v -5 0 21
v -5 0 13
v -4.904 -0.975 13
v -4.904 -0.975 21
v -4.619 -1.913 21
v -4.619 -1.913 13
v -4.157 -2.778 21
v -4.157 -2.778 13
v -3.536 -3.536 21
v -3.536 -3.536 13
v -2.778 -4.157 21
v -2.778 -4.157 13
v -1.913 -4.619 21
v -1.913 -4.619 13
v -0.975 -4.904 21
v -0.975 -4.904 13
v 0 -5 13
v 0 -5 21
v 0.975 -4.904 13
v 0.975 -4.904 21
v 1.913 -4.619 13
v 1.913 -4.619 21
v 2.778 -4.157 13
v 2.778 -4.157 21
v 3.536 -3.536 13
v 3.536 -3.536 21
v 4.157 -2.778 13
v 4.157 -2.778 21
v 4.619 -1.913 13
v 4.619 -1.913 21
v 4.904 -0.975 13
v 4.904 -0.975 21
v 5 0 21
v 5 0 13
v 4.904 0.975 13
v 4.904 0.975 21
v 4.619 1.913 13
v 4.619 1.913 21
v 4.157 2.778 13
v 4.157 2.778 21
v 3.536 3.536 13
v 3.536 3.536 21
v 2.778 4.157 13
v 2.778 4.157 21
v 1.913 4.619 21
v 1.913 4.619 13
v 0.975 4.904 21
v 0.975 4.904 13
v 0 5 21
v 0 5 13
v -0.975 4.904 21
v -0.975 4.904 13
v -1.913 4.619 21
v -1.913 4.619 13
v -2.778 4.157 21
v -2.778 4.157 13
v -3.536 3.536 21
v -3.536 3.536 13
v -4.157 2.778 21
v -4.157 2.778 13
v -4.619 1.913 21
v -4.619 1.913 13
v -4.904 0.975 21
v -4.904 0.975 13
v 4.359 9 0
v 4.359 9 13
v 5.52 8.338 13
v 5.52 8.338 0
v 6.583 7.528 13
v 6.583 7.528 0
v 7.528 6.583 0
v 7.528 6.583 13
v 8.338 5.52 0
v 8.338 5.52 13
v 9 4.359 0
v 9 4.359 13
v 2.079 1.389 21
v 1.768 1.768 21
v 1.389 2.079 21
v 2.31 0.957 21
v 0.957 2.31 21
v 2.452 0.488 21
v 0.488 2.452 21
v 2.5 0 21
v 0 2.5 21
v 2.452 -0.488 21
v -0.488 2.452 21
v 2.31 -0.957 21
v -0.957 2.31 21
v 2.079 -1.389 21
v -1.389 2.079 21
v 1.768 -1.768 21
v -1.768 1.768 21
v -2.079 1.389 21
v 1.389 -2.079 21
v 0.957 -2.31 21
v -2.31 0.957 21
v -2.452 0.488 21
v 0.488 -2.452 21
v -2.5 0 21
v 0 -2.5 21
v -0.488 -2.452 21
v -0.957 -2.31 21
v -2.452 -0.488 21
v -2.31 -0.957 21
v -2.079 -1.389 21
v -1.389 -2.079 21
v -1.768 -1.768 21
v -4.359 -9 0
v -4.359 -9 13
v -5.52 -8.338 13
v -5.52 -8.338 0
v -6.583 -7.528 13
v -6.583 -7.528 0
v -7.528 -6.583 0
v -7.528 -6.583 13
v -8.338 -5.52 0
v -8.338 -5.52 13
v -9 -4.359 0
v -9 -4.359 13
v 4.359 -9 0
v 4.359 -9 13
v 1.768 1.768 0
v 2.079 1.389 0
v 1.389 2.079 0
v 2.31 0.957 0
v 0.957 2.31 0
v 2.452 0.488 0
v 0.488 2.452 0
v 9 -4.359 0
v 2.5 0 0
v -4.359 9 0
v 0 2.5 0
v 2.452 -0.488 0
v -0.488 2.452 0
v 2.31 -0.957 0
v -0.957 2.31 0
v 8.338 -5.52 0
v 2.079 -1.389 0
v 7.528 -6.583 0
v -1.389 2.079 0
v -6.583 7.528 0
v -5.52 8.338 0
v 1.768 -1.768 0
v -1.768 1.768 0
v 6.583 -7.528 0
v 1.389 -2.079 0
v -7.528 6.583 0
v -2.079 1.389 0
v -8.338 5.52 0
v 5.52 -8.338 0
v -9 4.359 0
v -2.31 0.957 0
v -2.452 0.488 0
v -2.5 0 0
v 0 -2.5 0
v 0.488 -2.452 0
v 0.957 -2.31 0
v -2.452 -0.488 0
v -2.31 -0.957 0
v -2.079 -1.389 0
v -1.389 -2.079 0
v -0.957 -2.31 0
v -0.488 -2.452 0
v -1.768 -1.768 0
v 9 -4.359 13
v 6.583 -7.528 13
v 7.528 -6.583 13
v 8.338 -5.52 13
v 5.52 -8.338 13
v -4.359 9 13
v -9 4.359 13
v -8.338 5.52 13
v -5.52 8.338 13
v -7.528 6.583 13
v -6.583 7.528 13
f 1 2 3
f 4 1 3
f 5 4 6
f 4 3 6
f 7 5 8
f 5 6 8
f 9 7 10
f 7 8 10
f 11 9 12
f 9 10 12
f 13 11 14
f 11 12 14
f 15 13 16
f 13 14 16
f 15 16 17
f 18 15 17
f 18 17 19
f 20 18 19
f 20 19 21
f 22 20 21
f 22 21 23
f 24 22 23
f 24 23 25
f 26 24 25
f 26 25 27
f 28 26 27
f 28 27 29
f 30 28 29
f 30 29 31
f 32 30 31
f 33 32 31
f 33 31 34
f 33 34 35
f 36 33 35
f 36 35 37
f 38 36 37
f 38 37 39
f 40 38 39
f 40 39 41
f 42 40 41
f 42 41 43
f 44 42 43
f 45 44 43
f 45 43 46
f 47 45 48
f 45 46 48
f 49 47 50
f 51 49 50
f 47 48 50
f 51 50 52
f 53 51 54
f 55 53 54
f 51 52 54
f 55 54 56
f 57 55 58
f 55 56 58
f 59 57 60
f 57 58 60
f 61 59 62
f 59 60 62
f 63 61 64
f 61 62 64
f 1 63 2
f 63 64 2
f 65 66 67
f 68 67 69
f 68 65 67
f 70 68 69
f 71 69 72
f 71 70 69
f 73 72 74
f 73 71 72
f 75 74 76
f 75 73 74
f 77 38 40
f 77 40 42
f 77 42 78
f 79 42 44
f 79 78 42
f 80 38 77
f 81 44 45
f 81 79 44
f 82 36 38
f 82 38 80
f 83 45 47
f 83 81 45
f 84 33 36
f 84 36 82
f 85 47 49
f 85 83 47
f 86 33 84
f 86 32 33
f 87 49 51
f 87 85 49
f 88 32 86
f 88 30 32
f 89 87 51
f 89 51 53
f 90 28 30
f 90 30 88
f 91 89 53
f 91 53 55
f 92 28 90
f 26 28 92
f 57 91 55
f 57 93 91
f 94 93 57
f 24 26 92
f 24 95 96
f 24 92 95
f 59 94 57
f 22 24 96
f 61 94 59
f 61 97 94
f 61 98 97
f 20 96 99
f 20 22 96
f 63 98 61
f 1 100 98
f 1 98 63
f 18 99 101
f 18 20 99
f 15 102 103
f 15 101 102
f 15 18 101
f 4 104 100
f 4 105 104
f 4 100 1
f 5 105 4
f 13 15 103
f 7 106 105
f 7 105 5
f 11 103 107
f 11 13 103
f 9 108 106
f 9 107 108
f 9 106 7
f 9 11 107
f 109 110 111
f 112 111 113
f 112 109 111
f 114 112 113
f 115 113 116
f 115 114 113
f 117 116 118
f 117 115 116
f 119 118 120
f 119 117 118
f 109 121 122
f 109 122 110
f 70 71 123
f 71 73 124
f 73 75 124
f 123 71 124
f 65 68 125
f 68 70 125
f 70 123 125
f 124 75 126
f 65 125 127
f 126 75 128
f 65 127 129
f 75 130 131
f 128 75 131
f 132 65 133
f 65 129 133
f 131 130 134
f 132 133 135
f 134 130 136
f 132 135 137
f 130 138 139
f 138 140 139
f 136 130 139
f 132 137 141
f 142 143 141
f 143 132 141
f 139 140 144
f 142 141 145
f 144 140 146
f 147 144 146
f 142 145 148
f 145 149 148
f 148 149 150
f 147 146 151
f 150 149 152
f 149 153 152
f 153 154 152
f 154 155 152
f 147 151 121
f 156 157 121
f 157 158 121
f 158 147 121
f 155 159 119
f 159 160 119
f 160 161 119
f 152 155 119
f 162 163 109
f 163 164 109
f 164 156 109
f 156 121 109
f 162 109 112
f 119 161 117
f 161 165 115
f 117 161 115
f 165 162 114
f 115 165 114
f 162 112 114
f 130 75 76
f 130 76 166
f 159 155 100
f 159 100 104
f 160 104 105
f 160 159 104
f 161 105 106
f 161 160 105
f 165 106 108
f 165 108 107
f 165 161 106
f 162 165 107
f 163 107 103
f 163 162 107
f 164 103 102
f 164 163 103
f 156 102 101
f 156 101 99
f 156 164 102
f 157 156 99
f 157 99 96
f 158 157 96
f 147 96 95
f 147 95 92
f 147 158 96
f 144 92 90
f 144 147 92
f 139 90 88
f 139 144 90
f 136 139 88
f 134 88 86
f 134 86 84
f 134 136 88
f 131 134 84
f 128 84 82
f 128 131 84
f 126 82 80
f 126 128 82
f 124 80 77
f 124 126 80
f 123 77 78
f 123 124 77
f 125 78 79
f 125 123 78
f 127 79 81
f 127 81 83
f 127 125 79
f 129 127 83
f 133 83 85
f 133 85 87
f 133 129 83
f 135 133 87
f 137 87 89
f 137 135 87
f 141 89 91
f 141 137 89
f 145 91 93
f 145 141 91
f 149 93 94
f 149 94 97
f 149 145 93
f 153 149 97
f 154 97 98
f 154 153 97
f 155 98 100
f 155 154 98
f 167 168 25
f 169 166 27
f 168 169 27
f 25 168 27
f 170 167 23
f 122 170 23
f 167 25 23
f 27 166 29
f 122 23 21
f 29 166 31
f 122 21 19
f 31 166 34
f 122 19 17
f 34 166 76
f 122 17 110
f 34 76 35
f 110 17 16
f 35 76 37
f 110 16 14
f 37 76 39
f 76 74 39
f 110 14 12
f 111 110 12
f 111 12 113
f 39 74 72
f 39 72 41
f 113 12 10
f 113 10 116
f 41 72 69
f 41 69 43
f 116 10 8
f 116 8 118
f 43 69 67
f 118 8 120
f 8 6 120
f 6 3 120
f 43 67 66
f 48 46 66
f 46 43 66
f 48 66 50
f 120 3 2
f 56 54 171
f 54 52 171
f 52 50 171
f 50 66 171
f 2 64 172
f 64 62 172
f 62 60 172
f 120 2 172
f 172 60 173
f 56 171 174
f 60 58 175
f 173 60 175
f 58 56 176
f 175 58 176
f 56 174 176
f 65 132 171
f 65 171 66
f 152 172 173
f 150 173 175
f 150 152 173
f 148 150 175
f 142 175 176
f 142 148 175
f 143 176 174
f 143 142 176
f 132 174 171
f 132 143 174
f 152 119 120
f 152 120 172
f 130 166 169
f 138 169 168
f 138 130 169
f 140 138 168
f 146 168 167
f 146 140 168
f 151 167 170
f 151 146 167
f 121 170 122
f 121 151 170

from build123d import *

# Parameters (mm, degrees)
BOSS_EXTRUDE2_DEPTH = 13
SKETCH2_R           = 5
BOSS_EXTRUDE3_DEPTH = 21
SKETCH4_R           = 2.5
CUT_EXTRUDE1_DEPTH  = 21


with BuildPart() as part:
    # Sketch1 → Boss-Extrude2 (new body)
    with BuildSketch(Plane.XY):
        with BuildLine():
            Line((-4.358898944, 9), (4.358898944, 9))
            ThreePointArc((4.358898944, 9), (7.071067812, 7.071067812), (9, 4.358898944))
            Line((9, 4.358898944), (9, -4.358898944))
            ThreePointArc((9, -4.358898944), (7.071067812, -7.071067812), (4.358898944, -9))
            Line((4.358898944, -9), (-4.358898944, -9))
            ThreePointArc((-4.358898944, -9), (-7.071067812, -7.071067812), (-9, -4.358898944))
            Line((-9, -4.358898944), (-9, 4.358898944))
            ThreePointArc((-9, 4.358898944), (-7.071067812, 7.071067812), (-4.358898944, 9))
        make_face()
    extrude(amount=BOSS_EXTRUDE2_DEPTH)

    # Sketch2 → Boss-Extrude3 (add)
    with BuildSketch(Plane.XY):
        with Locations(Location((0, 0, 0), (0, 0, 180))):
            Circle(SKETCH2_R)
    extrude(amount=BOSS_EXTRUDE3_DEPTH)

    # Sketch4 → Cut-Extrude1 (cut)
    with BuildSketch(Plane.XY):
        with Locations(Location((0, 0, 0), (0, 0, 180))):
            Circle(SKETCH4_R)
    extrude(amount=CUT_EXTRUDE1_DEPTH, mode=Mode.SUBTRACT)


solid = part.part
